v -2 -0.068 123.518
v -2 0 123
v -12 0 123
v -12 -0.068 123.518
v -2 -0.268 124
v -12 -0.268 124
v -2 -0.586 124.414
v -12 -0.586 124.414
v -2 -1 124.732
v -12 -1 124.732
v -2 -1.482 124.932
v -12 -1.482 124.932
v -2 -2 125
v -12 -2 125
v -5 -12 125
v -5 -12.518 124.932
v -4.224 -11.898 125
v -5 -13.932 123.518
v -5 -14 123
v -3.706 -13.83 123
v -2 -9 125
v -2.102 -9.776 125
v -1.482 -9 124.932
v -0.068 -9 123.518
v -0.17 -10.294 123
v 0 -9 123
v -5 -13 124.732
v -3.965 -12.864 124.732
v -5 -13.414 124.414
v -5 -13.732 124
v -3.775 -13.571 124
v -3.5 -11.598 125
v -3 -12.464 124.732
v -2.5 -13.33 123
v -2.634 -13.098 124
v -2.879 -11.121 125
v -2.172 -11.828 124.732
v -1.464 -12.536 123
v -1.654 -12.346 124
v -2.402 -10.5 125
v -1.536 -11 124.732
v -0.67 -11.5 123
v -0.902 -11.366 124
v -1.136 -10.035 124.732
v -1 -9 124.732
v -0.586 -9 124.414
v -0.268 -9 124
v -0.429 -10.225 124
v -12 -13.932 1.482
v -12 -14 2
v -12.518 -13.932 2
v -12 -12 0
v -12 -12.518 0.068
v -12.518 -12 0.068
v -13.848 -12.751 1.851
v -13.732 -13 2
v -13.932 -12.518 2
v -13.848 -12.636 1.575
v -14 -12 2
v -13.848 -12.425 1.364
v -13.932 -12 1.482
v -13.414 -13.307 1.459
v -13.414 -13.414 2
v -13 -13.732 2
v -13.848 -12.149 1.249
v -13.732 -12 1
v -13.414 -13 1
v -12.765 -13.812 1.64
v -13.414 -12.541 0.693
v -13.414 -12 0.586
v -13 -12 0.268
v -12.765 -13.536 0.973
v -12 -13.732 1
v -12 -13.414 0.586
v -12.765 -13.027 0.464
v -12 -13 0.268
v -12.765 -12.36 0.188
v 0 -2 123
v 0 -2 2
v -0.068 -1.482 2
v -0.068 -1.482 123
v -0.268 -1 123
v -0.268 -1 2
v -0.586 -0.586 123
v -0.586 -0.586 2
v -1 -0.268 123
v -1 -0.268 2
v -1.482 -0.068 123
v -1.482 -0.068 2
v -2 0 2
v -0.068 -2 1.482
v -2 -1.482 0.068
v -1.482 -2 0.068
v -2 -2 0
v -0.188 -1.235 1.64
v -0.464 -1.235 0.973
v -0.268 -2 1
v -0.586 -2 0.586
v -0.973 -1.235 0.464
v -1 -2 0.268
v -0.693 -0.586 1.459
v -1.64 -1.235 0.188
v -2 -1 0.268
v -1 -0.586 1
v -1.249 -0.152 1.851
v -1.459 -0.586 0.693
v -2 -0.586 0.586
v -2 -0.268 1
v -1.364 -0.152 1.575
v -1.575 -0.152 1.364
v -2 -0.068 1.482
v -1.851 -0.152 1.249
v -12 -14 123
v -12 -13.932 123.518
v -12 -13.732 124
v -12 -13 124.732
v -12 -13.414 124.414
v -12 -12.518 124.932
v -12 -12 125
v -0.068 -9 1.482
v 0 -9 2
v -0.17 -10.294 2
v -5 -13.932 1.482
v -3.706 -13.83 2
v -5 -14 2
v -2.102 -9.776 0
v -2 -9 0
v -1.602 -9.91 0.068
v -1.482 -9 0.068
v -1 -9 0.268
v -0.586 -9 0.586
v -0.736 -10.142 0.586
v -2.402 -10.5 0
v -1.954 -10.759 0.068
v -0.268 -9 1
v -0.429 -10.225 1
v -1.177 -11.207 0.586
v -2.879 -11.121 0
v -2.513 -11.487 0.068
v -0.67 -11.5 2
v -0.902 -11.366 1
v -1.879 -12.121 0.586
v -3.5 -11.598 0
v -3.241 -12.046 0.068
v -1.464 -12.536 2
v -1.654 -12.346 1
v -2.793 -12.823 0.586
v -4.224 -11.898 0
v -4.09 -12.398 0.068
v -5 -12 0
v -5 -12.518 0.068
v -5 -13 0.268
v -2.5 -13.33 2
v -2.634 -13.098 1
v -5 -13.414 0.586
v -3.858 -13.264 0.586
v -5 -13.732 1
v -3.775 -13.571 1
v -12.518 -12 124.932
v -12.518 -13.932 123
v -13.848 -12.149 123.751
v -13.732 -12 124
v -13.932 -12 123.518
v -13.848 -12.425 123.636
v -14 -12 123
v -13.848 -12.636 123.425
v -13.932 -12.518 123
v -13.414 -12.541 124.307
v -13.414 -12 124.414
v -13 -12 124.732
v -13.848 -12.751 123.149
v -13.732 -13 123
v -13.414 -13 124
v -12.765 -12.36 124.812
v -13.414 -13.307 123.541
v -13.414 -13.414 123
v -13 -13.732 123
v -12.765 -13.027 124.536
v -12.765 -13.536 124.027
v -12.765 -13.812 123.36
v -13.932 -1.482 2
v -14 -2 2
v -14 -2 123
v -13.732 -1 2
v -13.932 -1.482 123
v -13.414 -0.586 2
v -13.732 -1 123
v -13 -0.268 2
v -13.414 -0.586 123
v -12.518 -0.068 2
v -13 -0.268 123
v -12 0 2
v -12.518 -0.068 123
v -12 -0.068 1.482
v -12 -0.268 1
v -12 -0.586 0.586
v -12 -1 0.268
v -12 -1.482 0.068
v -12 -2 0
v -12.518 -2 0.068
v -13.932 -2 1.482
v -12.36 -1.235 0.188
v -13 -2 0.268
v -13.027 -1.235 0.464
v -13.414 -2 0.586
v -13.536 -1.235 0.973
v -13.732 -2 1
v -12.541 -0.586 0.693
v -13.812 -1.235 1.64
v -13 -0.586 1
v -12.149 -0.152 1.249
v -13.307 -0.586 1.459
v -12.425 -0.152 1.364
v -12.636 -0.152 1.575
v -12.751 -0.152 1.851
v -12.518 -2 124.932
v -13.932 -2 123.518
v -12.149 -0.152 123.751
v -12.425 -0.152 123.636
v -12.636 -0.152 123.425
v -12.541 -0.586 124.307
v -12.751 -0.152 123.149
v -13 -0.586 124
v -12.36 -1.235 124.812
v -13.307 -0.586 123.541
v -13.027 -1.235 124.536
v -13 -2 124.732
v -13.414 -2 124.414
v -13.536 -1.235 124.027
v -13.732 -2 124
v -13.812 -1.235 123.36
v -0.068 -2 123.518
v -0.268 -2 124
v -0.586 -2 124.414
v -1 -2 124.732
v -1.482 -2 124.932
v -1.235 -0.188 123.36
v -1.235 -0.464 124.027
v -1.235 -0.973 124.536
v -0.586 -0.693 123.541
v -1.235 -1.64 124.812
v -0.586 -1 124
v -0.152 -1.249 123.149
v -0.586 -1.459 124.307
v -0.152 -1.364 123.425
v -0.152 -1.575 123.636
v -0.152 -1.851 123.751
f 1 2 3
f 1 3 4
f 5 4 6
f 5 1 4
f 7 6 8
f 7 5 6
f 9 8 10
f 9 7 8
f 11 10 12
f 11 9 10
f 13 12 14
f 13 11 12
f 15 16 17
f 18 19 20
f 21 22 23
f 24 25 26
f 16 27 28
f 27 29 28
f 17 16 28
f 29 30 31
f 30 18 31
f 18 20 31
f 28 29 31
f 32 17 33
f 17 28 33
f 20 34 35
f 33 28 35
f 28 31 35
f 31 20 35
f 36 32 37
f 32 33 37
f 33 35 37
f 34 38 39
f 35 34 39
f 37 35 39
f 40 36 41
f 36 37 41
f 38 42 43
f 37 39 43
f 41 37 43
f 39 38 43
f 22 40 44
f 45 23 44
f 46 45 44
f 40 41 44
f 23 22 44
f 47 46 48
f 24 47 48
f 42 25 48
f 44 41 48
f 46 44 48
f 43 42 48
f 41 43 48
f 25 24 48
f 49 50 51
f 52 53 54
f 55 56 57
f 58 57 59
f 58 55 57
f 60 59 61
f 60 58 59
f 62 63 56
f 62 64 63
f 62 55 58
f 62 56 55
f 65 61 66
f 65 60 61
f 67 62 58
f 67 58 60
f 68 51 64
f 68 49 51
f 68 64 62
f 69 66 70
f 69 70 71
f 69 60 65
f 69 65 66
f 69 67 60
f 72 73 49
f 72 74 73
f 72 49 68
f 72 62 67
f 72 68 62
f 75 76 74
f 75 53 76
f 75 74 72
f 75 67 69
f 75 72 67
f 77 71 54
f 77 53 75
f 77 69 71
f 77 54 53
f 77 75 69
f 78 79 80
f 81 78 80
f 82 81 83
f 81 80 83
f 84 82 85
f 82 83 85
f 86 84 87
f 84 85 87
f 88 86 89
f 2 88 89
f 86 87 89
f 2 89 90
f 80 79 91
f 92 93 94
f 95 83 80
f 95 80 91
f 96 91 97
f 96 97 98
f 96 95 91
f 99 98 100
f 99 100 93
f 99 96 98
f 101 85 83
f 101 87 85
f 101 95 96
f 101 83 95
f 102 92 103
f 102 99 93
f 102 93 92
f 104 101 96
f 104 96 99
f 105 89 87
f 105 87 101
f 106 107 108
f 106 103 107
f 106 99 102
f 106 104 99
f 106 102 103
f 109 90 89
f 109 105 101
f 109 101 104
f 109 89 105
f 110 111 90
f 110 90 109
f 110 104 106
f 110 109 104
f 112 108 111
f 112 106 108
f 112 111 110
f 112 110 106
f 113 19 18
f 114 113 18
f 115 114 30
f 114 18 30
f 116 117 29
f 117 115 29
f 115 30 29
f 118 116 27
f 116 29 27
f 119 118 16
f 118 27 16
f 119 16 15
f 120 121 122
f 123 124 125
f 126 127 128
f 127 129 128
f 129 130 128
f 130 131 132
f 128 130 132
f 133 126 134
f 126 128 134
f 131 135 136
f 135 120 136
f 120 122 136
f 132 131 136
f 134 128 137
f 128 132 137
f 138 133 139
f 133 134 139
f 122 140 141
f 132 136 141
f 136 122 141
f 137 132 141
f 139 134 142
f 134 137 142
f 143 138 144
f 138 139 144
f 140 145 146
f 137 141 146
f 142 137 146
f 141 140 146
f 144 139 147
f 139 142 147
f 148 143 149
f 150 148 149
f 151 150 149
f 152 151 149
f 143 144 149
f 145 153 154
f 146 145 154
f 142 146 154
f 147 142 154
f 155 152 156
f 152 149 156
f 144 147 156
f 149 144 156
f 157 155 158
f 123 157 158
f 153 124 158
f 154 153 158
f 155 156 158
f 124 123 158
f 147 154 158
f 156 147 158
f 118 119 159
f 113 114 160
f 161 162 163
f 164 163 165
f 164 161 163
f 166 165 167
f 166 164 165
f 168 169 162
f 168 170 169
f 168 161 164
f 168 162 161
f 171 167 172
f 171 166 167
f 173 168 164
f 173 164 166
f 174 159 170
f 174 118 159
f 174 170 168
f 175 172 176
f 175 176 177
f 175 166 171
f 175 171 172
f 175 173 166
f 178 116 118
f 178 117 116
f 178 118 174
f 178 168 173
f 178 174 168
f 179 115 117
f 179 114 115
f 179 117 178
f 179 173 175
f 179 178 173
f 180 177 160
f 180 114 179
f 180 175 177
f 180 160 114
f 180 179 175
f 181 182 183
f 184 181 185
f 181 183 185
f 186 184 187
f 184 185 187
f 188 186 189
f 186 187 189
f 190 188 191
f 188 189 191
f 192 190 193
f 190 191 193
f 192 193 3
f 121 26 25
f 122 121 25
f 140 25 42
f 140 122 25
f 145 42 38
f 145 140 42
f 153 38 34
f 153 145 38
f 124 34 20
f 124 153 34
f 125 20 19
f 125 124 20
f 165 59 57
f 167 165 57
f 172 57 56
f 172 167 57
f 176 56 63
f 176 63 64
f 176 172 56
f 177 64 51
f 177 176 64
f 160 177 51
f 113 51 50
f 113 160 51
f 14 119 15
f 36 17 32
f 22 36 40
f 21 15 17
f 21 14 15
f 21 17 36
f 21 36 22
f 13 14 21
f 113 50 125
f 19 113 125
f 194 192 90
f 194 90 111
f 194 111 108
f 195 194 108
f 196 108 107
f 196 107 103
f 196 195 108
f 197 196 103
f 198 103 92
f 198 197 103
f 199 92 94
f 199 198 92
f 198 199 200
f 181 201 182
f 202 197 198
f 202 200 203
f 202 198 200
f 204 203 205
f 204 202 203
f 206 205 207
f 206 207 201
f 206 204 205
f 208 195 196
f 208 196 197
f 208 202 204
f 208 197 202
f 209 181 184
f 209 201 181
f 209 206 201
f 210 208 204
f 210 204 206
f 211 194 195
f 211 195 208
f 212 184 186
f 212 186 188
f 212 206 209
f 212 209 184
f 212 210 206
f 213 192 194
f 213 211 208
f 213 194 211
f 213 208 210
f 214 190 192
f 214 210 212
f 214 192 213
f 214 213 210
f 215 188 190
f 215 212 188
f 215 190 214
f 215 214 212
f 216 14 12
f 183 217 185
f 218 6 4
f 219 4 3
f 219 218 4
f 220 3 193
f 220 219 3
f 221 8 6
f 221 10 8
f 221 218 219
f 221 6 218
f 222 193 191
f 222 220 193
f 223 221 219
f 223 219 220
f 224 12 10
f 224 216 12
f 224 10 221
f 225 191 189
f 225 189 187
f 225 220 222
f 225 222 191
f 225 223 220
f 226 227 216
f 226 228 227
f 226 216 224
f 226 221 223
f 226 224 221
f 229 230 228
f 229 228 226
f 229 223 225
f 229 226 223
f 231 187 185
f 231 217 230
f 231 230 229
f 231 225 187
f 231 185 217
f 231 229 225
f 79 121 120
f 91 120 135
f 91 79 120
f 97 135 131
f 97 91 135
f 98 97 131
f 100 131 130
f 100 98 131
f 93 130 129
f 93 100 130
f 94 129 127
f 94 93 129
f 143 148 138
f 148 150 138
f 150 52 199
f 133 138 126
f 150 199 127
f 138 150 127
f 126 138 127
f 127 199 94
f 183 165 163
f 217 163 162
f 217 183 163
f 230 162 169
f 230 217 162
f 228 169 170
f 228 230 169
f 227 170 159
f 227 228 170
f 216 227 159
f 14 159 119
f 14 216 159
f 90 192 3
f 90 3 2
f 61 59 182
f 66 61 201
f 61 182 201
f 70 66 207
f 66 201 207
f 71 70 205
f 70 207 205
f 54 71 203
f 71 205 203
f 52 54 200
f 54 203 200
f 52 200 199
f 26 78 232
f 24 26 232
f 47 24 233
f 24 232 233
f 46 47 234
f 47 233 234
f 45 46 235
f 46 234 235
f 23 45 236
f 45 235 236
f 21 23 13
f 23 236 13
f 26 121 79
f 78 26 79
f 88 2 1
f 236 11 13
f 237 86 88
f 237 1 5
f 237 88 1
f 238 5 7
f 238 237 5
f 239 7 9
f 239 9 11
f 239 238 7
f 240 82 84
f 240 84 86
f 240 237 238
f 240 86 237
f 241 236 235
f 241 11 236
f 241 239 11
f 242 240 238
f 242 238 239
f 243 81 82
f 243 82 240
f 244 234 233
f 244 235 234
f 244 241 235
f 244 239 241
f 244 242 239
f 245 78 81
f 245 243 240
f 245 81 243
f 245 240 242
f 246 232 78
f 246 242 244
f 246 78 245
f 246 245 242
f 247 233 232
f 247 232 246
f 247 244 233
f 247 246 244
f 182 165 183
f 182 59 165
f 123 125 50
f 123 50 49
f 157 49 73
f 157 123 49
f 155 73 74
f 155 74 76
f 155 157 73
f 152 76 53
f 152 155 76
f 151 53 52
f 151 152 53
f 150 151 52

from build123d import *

# Parameters (mm, degrees)
F0_W         = 14
F0_H         = 14
F1_DEPTH     = 125
F2_R         = 2
F3_T1_DEPTH  = 125
F3_T4_ANGLE  = 90
F3_T6_ANGLE  = 90
F4_T1_DEPTH  = 121
F4_T3_DEPTH  = 10
F4_S7_W      = 2
F4_S7_H      = 2
F4_T8_DEPTH  = 2
F4_S13_W     = 2
F4_S13_H     = 2
F4_T14_DEPTH = 2
F4_T18_ANGLE = 90


# Not quite as in the source:
# - a fillet or chamfer that OpenCascade refuses, or shapes differently, is made with other operations: its cross-section is extruded or revolved along the edge and cut away or added


with BuildPart() as f1:
    # F0 (on Top) → F1 (new body)
    with BuildSketch(Plane.XY):
        with Locations((-7, -7)):
            Rectangle(F0_W, F0_H)
    extrude(amount=F1_DEPTH)

    # F2
    f2_edges = [f1.edges().sort_by_distance(p)[0] for p in [
        (-7, -14, 125),
        (0, -7, 125),
        (-7, -14, 0),
        (0, -7, 0),
        (-14, -7, 125),
        (-7, 0, 125),
        (-14, 0, 62.5),
        (-14, -14, 62.5),
        (-14, -7, 0),
    ]]
    fillet(f2_edges, radius=F2_R)

    # F3: fillet of radius 5 on 1 edges, made by hand

    # F3_s2 → F3_t1 (cut)
    with BuildSketch(Plane.XY):
        with BuildLine():
            ThreePointArc((0, -9), (-1.4644660941, -12.5355339059), (-5, -14))
            Line((-5, -14), (0, -14))
            Line((0, -14), (0, -9))
        make_face()
    extrude(amount=F3_T1_DEPTH, mode=Mode.SUBTRACT)

    # F3_s3 → F3_t4 (revolve, cut)
    with BuildSketch(Plane.XZ.offset(9)):
        with BuildLine():
            ThreePointArc((-2, 0), (-0.5857864376, 0.5857864376), (0, 2))
            Line((0, 2), (0, 0))
            Line((0, 0), (-2, 0))
        make_face()
    revolve(axis=Axis((-5, -9, 0), (0, 0, -1)), revolution_arc=F3_T4_ANGLE, mode=Mode.SUBTRACT)

    # F3_s5 → F3_t6 (revolve, cut)
    with BuildSketch(Plane.YZ.offset(-5)):
        with BuildLine():
            ThreePointArc((-12, 125), (-13.4142135624, 124.4142135624), (-14, 123))
            Line((-14, 123), (-14, 125))
            Line((-14, 125), (-12, 125))
        make_face()
    revolve(axis=Axis((-5, -9, 125), (0, 0, 1)), revolution_arc=F3_T6_ANGLE, mode=Mode.SUBTRACT)

    # F4: fillet of radius 2 on 2 edges, made by hand

    # F4_s2 → F4_t1 (cut)
    with BuildSketch(Plane.XY.offset(2)):
        with BuildLine():
            ThreePointArc((0, -2), (-0.5857864376, -0.5857864376), (-2, 0))
            Line((-2, 0), (0, 0))
            Line((0, 0), (0, -2))
        make_face()
    extrude(amount=F4_T1_DEPTH, mode=Mode.SUBTRACT)

    # F4_s4 → F4_t3 (cut)
    with BuildSketch(Plane.YZ.offset(-12)):
        with BuildLine():
            ThreePointArc((0, 2), (-0.5857864376, 0.5857864376), (-2, 0))
            Line((-2, 0), (0, 0))
            Line((0, 0), (0, 2))
        make_face()
    extrude(amount=F4_T3_DEPTH, mode=Mode.SUBTRACT)


with BuildPart() as f4_tool6:
    # F4_s7 → F4_t8 (new body)
    with BuildSketch(Plane.YZ.offset(-2)):
        with Locations((-1, 124)):
            Rectangle(F4_S7_W, F4_S7_H)
    extrude(amount=F4_T8_DEPTH)

    # F4_s9 → F4_t10 (revolve, cut)
    with BuildSketch(Plane(origin=(-2, -2, 123), x_dir=(0, -0.7071067812, -0.7071067812), z_dir=(0, -0.7071067812, 0.7071067812))):
        with BuildLine():
            ThreePointArc((0, -2), (2, 0), (0, 2))
            Line((0, 2), (0, -2))
        make_face()
    revolve(axis=Axis((-2, -2, 123), (1, 0, 0)), mode=Mode.SUBTRACT)


with BuildPart() as f1_1:
    add(f1.part)

    # F4_t5: cut F4_tool6
    add(f4_tool6.part, mode=Mode.SUBTRACT)


with BuildPart() as f4_tool12:
    # F4_s13 → F4_t14 (new body)
    with BuildSketch(Plane.XZ.offset(2)):
        with Locations((-13, 1)):
            Rectangle(F4_S13_W, F4_S13_H)
    extrude(amount=-F4_T14_DEPTH)

    # F4_s15 → F4_t16 (revolve, cut)
    with BuildSketch(Plane(origin=(-12, -2, 2), x_dir=(0.7071067812, 0, 0.7071067812), z_dir=(-0.7071067812, 0, 0.7071067812))):
        with BuildLine():
            ThreePointArc((0, -2), (2, 0), (0, 2))
            Line((0, 2), (0, -2))
        make_face()
    revolve(axis=Axis((-12, -2, 2), (0, 1, 0)), mode=Mode.SUBTRACT)


with BuildPart() as f1_2:
    add(f1_1.part)

    # F4_t11: cut F4_tool12
    add(f4_tool12.part, mode=Mode.SUBTRACT)

    # F4_s17 → F4_t18 (revolve, cut)
    with BuildSketch(Plane.XY.offset(2)):
        with BuildLine():
            ThreePointArc((0, -2), (-0.5857864376, -0.5857864376), (-2, 0))
            Line((-2, 0), (0, 0))
            Line((0, 0), (0, -2))
        make_face()
    revolve(axis=Axis((-2, 0, 2), (0, 1, 0)), revolution_arc=F4_T18_ANGLE, mode=Mode.SUBTRACT)


solid = f1_2.part
